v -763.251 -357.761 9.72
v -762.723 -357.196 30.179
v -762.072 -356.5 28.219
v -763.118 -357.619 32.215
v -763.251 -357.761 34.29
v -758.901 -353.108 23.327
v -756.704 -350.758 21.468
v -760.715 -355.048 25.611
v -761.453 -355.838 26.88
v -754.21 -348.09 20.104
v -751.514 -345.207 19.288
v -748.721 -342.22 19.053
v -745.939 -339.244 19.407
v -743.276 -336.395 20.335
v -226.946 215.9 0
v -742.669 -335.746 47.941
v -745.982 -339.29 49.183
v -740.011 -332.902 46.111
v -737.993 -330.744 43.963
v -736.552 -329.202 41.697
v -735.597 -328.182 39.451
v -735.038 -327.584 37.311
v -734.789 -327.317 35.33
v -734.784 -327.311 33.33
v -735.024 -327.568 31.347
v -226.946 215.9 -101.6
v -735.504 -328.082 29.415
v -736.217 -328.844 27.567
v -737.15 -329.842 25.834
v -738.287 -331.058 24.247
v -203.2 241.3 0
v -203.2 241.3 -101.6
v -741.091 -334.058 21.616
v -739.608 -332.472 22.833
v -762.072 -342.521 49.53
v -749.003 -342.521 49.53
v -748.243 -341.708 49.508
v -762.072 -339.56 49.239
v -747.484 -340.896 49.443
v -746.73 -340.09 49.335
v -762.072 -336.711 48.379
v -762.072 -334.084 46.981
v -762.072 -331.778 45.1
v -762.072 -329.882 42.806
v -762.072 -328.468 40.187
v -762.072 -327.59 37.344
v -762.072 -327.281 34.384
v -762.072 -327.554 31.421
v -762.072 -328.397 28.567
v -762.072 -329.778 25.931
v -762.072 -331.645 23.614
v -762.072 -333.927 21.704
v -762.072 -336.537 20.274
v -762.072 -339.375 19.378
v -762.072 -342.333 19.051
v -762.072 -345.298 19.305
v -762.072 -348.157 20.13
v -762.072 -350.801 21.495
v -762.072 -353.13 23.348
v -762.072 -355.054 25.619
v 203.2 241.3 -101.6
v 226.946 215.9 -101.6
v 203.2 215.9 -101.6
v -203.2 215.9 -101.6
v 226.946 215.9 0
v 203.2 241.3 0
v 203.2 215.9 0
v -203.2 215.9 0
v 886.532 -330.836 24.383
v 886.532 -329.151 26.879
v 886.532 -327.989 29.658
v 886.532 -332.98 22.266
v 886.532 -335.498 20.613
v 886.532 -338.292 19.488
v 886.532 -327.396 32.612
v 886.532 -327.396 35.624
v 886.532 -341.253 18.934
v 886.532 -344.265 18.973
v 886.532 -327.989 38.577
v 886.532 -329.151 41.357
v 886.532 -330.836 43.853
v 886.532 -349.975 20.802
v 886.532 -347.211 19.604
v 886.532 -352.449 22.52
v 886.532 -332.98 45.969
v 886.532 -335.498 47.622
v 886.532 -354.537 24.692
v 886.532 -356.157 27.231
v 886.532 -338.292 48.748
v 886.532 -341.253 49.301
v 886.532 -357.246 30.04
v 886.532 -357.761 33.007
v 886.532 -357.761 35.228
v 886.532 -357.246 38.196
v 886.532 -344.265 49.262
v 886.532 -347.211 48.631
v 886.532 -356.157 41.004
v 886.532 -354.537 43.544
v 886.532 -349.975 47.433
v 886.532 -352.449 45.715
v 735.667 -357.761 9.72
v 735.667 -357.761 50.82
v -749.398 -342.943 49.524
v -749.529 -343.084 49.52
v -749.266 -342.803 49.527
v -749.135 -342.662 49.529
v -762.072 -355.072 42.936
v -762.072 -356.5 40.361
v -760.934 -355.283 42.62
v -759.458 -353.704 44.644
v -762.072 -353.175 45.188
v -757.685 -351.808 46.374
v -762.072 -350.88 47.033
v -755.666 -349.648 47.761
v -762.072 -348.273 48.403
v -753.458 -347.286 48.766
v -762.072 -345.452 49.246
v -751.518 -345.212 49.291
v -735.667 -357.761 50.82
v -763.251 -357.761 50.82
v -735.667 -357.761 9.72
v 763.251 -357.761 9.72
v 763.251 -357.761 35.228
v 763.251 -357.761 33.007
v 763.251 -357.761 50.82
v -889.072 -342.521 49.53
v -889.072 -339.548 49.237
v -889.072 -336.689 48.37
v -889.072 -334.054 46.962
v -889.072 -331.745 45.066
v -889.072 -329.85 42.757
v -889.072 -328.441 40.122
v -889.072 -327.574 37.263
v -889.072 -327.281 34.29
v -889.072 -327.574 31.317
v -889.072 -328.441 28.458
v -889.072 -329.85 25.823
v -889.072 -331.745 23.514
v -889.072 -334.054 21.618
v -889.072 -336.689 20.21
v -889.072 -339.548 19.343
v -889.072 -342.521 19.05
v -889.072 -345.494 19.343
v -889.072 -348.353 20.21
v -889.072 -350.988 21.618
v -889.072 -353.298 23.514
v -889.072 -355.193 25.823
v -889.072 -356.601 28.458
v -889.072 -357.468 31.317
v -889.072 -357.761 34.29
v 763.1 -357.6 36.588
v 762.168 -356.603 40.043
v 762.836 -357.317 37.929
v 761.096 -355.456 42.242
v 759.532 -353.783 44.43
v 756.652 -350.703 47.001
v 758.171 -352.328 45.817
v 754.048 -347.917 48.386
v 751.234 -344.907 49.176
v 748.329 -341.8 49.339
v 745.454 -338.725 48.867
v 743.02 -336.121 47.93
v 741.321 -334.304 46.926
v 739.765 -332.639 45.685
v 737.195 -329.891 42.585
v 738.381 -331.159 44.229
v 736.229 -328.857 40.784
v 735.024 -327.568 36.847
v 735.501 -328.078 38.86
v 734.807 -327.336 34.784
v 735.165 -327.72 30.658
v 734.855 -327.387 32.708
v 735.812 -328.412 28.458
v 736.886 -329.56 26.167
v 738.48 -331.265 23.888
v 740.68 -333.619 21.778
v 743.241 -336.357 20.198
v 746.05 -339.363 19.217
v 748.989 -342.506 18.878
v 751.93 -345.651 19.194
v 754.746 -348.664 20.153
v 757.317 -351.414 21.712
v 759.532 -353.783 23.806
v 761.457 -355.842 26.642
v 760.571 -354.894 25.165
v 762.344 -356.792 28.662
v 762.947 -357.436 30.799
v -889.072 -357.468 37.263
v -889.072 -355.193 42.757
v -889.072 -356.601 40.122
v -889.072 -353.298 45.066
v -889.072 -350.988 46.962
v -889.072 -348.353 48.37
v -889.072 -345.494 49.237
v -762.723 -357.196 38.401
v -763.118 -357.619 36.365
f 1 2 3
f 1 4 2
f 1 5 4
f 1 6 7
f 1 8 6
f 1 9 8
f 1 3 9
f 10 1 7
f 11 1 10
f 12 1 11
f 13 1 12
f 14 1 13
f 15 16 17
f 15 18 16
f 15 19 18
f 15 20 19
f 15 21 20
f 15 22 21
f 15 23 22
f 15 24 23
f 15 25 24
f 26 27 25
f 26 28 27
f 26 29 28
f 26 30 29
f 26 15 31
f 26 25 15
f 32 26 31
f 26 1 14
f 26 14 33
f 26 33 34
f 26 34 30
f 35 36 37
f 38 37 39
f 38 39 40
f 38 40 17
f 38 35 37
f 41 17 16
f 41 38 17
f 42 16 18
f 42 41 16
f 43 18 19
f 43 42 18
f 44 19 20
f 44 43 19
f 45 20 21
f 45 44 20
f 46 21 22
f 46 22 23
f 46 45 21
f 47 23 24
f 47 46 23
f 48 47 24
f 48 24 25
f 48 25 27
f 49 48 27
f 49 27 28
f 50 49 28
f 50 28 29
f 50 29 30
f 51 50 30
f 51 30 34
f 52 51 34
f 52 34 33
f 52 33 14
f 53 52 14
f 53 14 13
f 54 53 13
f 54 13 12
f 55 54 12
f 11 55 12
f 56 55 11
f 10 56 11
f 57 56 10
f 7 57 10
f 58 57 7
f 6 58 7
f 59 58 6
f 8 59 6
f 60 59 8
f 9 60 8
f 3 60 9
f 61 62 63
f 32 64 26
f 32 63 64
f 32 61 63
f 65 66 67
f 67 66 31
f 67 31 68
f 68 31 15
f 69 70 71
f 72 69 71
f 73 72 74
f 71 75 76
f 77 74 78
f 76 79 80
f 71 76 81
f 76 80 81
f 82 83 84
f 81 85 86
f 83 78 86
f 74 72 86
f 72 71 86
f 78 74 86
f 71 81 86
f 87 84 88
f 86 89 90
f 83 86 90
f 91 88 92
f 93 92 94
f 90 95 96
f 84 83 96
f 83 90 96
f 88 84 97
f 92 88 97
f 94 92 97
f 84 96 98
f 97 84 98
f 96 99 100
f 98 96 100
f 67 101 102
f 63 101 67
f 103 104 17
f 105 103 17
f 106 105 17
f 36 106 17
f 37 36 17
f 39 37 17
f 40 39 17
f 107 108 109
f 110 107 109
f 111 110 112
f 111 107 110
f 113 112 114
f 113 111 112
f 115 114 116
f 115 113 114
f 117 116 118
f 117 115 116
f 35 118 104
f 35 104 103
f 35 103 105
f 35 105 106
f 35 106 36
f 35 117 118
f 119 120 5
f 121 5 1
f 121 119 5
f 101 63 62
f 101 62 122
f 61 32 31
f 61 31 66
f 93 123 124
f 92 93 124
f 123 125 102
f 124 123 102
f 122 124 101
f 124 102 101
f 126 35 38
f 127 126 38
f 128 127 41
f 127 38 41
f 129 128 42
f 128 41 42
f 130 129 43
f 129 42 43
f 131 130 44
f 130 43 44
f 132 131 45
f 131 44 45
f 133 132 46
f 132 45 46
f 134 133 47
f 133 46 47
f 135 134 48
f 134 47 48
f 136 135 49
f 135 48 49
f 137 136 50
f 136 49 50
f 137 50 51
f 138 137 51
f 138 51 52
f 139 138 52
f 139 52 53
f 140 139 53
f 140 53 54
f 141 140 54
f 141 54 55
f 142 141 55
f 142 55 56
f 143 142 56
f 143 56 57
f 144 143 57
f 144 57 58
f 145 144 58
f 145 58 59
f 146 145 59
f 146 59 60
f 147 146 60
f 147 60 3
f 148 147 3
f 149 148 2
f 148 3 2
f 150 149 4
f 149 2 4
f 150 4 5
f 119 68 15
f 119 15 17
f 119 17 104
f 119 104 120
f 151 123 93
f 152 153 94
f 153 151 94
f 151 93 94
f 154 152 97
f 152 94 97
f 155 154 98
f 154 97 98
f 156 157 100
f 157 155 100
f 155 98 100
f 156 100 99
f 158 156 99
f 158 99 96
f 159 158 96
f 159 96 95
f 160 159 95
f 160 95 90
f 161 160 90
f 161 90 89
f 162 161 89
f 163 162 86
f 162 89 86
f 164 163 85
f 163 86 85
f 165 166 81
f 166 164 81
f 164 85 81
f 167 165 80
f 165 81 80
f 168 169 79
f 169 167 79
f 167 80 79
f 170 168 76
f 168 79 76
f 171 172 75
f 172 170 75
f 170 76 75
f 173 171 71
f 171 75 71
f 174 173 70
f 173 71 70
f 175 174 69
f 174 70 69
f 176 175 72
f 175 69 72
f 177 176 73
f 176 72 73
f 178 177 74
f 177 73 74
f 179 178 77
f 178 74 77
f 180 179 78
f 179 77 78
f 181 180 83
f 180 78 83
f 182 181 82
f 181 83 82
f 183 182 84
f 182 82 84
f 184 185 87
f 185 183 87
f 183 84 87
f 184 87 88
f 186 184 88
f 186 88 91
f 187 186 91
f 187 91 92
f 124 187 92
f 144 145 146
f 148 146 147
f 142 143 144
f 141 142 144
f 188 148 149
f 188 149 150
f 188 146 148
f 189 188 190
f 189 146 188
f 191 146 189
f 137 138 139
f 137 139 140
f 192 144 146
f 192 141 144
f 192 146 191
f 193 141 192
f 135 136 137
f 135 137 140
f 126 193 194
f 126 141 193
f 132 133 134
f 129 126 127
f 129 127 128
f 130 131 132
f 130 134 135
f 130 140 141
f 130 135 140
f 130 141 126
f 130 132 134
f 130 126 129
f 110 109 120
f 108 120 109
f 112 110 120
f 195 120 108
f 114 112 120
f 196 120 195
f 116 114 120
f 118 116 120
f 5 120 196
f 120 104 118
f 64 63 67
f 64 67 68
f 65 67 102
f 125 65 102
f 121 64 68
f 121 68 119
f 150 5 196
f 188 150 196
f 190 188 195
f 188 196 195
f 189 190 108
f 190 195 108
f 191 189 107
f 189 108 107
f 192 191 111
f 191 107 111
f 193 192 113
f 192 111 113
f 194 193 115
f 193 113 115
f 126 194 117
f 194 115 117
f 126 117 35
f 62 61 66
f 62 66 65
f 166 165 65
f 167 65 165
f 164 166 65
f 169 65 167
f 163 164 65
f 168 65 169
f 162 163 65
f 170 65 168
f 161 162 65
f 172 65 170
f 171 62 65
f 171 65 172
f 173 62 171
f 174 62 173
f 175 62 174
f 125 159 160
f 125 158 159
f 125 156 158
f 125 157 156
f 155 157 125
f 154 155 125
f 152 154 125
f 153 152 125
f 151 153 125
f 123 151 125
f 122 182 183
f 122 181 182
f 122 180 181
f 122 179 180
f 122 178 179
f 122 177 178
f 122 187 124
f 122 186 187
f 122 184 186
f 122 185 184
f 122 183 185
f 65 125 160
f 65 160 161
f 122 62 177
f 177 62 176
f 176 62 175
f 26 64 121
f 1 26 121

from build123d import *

# Parameters (mm, degrees)
BOSS_EXTRUDE6_DEPTH              = 53.34
BOSS_EXTRUDE6_DEPTH_BACK         = 101.6
CUT_EXTRUDE8_REACH               = 902.262
CUT_EXTRUDE8_DIRECTION_2_REACH   = 902.262
SKETCH15_R                       = 19.05
BOSS_EXTRUDE8_DEPTH              = 127
CUT_EXTRUDE9_REACH               = 1709.816
SKETCH16_W                       = 38.1
SKETCH16_H                       = 10.414
CUT_EXTRUDE9_DIRECTION_2_REACH   = 1709.816
SKETCH17_R                       = 15.24
BOSS_EXTRUDE9_DEPTH              = 127
BOSS_EXTRUDE9_DIRECTION_2_REACH  = 1707.258
SKETCH18_R                       = 15.24
BOSS_EXTRUDE10_DEPTH             = 127
BOSS_EXTRUDE10_DIRECTION_2_REACH = 1704.799
CUT_EXTRUDE10_REACH              = 1704.799
CUT_EXTRUDE10_DIRECTION_2_REACH  = 1704.799


with BuildPart() as part:
    # Sketch12 → Boss-Extrude6 (new, two sides: drawn at the far end of the back side and taken through both)
    with BuildSketch(Plane.XY.offset(-BOSS_EXTRUDE6_DEPTH_BACK)):
        Polygon((-203.2, 241.3), (203.2, 241.3), (787.471663752, -383.669201703), (787.471663752, -424.309201703), (762.071663752, -424.309201703), (762.071663752, -386.209201703), (203.2, 215.9), (-203.2, 215.9), (-762.071663752, -386.209201703), (-762.071663752, -424.309201703), (-787.471663752, -424.309201703), (-787.471663752, -383.669201703), align=None)
    extrude(amount=BOSS_EXTRUDE6_DEPTH + BOSS_EXTRUDE6_DEPTH_BACK)

    # Cut-Extrude8: up to this plane
    cut_extrude8_end = Plane(origin=(-203.2, 241.3, -101.6), z_dir=(-0.7304911811601322, 0.6829221289775833, 0))
    # Sketch14 → Cut-Extrude8 (cut, up to the surface)
    with BuildSketch(Plane(origin=(0, 0, 0), x_dir=(0, 0, -1), z_dir=(1, 0, 0)), mode=Mode.PRIVATE) as cut_extrude8_sk1:
        Polygon((0, 241.3), (0, 215.9), (-53.34, -386.209201703), (-53.34, 241.3), align=None)
    cut_extrude8_tool1 = split(extrude(cut_extrude8_sk1.sketch, amount=-CUT_EXTRUDE8_REACH, mode=Mode.PRIVATE), bisect_by=cut_extrude8_end, keep=Keep.BOTH, mode=Mode.PRIVATE)
    add(cut_extrude8_tool1.solids().sort_by_distance((0, 31.800889, 34.868308))[0], mode=Mode.SUBTRACT)
    # Sketch14 → Cut-Extrude8 (cut, up to the surface)
    with BuildSketch(Plane(origin=(0, 0, 0), x_dir=(0, 0, -1), z_dir=(1, 0, 0)), mode=Mode.PRIVATE) as cut_extrude8_sk2:
        Polygon((101.6, 215.9), (-15.24, -386.209201703), (-15.24, -424.309201703), (101.6, -424.309201703), align=None)
    cut_extrude8_tool2 = split(extrude(cut_extrude8_sk2.sketch, amount=-CUT_EXTRUDE8_REACH, mode=Mode.PRIVATE), bisect_by=cut_extrude8_end, keep=Keep.BOTH, mode=Mode.PRIVATE)
    add(cut_extrude8_tool2.solids().sort_by_distance((0, -210.192787, -60.465735))[0], mode=Mode.SUBTRACT)

    # Cut-Extrude8 direction 2: up to this plane
    cut_extrude8_direction_2_end = Plane(origin=(203.2, 241.3, -101.6), z_dir=(0.7304911811601321, 0.6829221289775835, 0))
    # Sketch14 → Cut-Extrude8 direction 2 (cut, up to the surface)
    with BuildSketch(Plane(origin=(0, 0, 0), x_dir=(0, 0, -1), z_dir=(1, 0, 0)), mode=Mode.PRIVATE) as cut_extrude8_direction_2_sk1:
        Polygon((0, 241.3), (0, 215.9), (-53.34, -386.209201703), (-53.34, 241.3), align=None)
    cut_extrude8_direction_2_tool1 = split(extrude(cut_extrude8_direction_2_sk1.sketch, amount=CUT_EXTRUDE8_DIRECTION_2_REACH, mode=Mode.PRIVATE), bisect_by=cut_extrude8_direction_2_end, keep=Keep.BOTH, mode=Mode.PRIVATE)
    add(cut_extrude8_direction_2_tool1.solids().sort_by_distance((0, 31.800889, 34.868308))[0], mode=Mode.SUBTRACT)
    # Sketch14 → Cut-Extrude8 direction 2 (cut, up to the surface)
    with BuildSketch(Plane(origin=(0, 0, 0), x_dir=(0, 0, -1), z_dir=(1, 0, 0)), mode=Mode.PRIVATE) as cut_extrude8_direction_2_sk2:
        Polygon((101.6, 215.9), (-15.24, -386.209201703), (-15.24, -424.309201703), (101.6, -424.309201703), align=None)
    cut_extrude8_direction_2_tool2 = split(extrude(cut_extrude8_direction_2_sk2.sketch, amount=CUT_EXTRUDE8_DIRECTION_2_REACH, mode=Mode.PRIVATE), bisect_by=cut_extrude8_direction_2_end, keep=Keep.BOTH, mode=Mode.PRIVATE)
    add(cut_extrude8_direction_2_tool2.solids().sort_by_distance((0, -210.192787, -60.465735))[0], mode=Mode.SUBTRACT)

    # Sketch15 → Boss-Extrude8 (add)
    with BuildSketch(Plane.ZY.offset(762.071663752)):
        with Locations((34.29, -394.845201703)):
            Circle(SKETCH15_R)
    boss_extrude8 = extrude(amount=BOSS_EXTRUDE8_DEPTH)

    # Mirror2: Boss-Extrude8 across plane
    add(boss_extrude8.mirror(Plane(origin=(0, 0, 0), x_dir=(0, 0, 1), z_dir=(1, 0, 0))))

    # Cut-Extrude9: up to this face of the body (flat: up to its plane)
    cut_extrude9_end = Plane(part.part.faces().sort_by_distance((-787.471663752, -416.434815963, 34.29))[0])
    # Sketch16 → Cut-Extrude9 (cut, up to the picked face)
    with BuildSketch(Plane.ZY.offset(762.071663752), mode=Mode.PRIVATE) as cut_extrude9_sk1:
        with Locations((34.29, -419.102201703)):
            Rectangle(SKETCH16_W, SKETCH16_H)
    cut_extrude9_tool1 = split(extrude(cut_extrude9_sk1.sketch, amount=CUT_EXTRUDE9_REACH, mode=Mode.PRIVATE), bisect_by=cut_extrude9_end, keep=Keep.BOTH, mode=Mode.PRIVATE)
    add(cut_extrude9_tool1.solids().sort_by(Axis((-762.071664, -419.102202, 34.29), (-1, 0, 0)))[0], mode=Mode.SUBTRACT)

    # Cut-Extrude9 direction 2: up to this face of the body (flat: up to its plane)
    cut_extrude9_direction_2_end = Plane(part.part.faces().sort_by_distance((787.471663752, -416.434815963, 34.29))[0])
    # Sketch16 → Cut-Extrude9 direction 2 (cut, up to the picked face)
    with BuildSketch(Plane.ZY.offset(762.071663752), mode=Mode.PRIVATE) as cut_extrude9_direction_2_sk1:
        with Locations((34.29, -419.102201703)):
            Rectangle(SKETCH16_W, SKETCH16_H)
    cut_extrude9_direction_2_tool1 = split(extrude(cut_extrude9_direction_2_sk1.sketch, amount=-CUT_EXTRUDE9_DIRECTION_2_REACH, mode=Mode.PRIVATE), bisect_by=cut_extrude9_direction_2_end, keep=Keep.BOTH, mode=Mode.PRIVATE)
    add(cut_extrude9_direction_2_tool1.solids().sort_by(Axis((-762.071664, -419.102202, 34.29), (1, 0, 0)))[0], mode=Mode.SUBTRACT)

    # Sketch17 → Boss-Extrude9 (add)
    with BuildSketch(Plane.ZY.offset(762.071663752)):
        with Locations((34.29, -342.521201703)):
            Circle(SKETCH17_R)
    extrude(amount=BOSS_EXTRUDE9_DEPTH)

    # Boss-Extrude9 direction 2: up to this face of the body (flat: up to its plane)
    boss_extrude9_direction_2_end = Plane(part.part.faces().sort_by_distance((-449.243763763, -21.881982223, -17.095411005))[0])
    # Sketch17 → Boss-Extrude9 direction 2 (add, up to the picked face)
    with BuildSketch(Plane.ZY.offset(762.071663752), mode=Mode.PRIVATE) as boss_extrude9_direction_2_sk1:
        with Locations((34.29, -342.521201703)):
            Circle(SKETCH17_R)
    boss_extrude9_direction_2_tool1 = split(extrude(boss_extrude9_direction_2_sk1.sketch, amount=-BOSS_EXTRUDE9_DIRECTION_2_REACH, mode=Mode.PRIVATE), bisect_by=boss_extrude9_direction_2_end, keep=Keep.BOTH, mode=Mode.PRIVATE)
    add(boss_extrude9_direction_2_tool1.solids().sort_by(Axis((-762.071664, -342.521202, 34.29), (1, 0, 0)))[0])

    # Sketch18 → Boss-Extrude10 (add)
    with BuildSketch(Plane.ZY.offset(-759.531663752)):
        with Locations(Location((34.117724321, -342.561697921, 0), (0, 0, 270))):
            Circle(SKETCH18_R)
    extrude(amount=-BOSS_EXTRUDE10_DEPTH)

    # Boss-Extrude10 direction 2: up to this face of the body (flat: up to its plane)
    boss_extrude10_direction_2_end = Plane(part.part.faces().sort_by_distance((449.243763763, -21.881982223, -17.095411005))[0])
    # Sketch18 → Boss-Extrude10 direction 2 (add, up to the picked face)
    with BuildSketch(Plane.ZY.offset(-759.531663752), mode=Mode.PRIVATE) as boss_extrude10_direction_2_sk1:
        with Locations(Location((34.117724321, -342.561697921, 0), (0, 0, 270))):
            Circle(SKETCH18_R)
    boss_extrude10_direction_2_tool1 = split(extrude(boss_extrude10_direction_2_sk1.sketch, amount=BOSS_EXTRUDE10_DIRECTION_2_REACH, mode=Mode.PRIVATE), bisect_by=boss_extrude10_direction_2_end, keep=Keep.BOTH, mode=Mode.PRIVATE)
    add(boss_extrude10_direction_2_tool1.solids().sort_by(Axis((759.531664, -342.561698, 34.117724), (-1, 0, 0)))[0])

    # Cut-Extrude10: up to this face of the body (flat: up to its plane)
    cut_extrude10_end = Plane(part.part.faces().sort_by_distance((889.071663752, -394.845201703, 34.29))[0])
    # Sketch19 → Cut-Extrude10 (cut, up to the picked face)
    with BuildSketch(Plane.ZY.offset(-759.531663752), mode=Mode.PRIVATE) as cut_extrude10_sk1:
        Polygon((53.34, -413.895201703), (53.34, -360.809201703), (53.34, -357.761201703), (9.719632082, -357.761201703), (9.719632082, -413.895201703), (10.311100074, -413.895201703), align=None)
    cut_extrude10_tool1 = split(extrude(cut_extrude10_sk1.sketch, amount=-CUT_EXTRUDE10_REACH, mode=Mode.PRIVATE), bisect_by=cut_extrude10_end, keep=Keep.BOTH, mode=Mode.PRIVATE)
    add(cut_extrude10_tool1.solids().sort_by(Axis((759.531664, -385.828202, 31.529816), (1, 0, 0)))[0], mode=Mode.SUBTRACT)

    # Cut-Extrude10 direction 2: up to this face of the body (flat: up to its plane)
    cut_extrude10_direction_2_end = Plane(part.part.faces().sort_by_distance((-889.071663752, -394.845201703, 34.29))[0])
    # Sketch19 → Cut-Extrude10 direction 2 (cut, up to the picked face)
    with BuildSketch(Plane.ZY.offset(-759.531663752), mode=Mode.PRIVATE) as cut_extrude10_direction_2_sk1:
        Polygon((53.34, -413.895201703), (53.34, -360.809201703), (53.34, -357.761201703), (9.719632082, -357.761201703), (9.719632082, -413.895201703), (10.311100074, -413.895201703), align=None)
    cut_extrude10_direction_2_tool1 = split(extrude(cut_extrude10_direction_2_sk1.sketch, amount=CUT_EXTRUDE10_DIRECTION_2_REACH, mode=Mode.PRIVATE), bisect_by=cut_extrude10_direction_2_end, keep=Keep.BOTH, mode=Mode.PRIVATE)
    add(cut_extrude10_direction_2_tool1.solids().sort_by(Axis((759.531664, -385.828202, 31.529816), (-1, 0, 0)))[0], mode=Mode.SUBTRACT)


solid = part.part
